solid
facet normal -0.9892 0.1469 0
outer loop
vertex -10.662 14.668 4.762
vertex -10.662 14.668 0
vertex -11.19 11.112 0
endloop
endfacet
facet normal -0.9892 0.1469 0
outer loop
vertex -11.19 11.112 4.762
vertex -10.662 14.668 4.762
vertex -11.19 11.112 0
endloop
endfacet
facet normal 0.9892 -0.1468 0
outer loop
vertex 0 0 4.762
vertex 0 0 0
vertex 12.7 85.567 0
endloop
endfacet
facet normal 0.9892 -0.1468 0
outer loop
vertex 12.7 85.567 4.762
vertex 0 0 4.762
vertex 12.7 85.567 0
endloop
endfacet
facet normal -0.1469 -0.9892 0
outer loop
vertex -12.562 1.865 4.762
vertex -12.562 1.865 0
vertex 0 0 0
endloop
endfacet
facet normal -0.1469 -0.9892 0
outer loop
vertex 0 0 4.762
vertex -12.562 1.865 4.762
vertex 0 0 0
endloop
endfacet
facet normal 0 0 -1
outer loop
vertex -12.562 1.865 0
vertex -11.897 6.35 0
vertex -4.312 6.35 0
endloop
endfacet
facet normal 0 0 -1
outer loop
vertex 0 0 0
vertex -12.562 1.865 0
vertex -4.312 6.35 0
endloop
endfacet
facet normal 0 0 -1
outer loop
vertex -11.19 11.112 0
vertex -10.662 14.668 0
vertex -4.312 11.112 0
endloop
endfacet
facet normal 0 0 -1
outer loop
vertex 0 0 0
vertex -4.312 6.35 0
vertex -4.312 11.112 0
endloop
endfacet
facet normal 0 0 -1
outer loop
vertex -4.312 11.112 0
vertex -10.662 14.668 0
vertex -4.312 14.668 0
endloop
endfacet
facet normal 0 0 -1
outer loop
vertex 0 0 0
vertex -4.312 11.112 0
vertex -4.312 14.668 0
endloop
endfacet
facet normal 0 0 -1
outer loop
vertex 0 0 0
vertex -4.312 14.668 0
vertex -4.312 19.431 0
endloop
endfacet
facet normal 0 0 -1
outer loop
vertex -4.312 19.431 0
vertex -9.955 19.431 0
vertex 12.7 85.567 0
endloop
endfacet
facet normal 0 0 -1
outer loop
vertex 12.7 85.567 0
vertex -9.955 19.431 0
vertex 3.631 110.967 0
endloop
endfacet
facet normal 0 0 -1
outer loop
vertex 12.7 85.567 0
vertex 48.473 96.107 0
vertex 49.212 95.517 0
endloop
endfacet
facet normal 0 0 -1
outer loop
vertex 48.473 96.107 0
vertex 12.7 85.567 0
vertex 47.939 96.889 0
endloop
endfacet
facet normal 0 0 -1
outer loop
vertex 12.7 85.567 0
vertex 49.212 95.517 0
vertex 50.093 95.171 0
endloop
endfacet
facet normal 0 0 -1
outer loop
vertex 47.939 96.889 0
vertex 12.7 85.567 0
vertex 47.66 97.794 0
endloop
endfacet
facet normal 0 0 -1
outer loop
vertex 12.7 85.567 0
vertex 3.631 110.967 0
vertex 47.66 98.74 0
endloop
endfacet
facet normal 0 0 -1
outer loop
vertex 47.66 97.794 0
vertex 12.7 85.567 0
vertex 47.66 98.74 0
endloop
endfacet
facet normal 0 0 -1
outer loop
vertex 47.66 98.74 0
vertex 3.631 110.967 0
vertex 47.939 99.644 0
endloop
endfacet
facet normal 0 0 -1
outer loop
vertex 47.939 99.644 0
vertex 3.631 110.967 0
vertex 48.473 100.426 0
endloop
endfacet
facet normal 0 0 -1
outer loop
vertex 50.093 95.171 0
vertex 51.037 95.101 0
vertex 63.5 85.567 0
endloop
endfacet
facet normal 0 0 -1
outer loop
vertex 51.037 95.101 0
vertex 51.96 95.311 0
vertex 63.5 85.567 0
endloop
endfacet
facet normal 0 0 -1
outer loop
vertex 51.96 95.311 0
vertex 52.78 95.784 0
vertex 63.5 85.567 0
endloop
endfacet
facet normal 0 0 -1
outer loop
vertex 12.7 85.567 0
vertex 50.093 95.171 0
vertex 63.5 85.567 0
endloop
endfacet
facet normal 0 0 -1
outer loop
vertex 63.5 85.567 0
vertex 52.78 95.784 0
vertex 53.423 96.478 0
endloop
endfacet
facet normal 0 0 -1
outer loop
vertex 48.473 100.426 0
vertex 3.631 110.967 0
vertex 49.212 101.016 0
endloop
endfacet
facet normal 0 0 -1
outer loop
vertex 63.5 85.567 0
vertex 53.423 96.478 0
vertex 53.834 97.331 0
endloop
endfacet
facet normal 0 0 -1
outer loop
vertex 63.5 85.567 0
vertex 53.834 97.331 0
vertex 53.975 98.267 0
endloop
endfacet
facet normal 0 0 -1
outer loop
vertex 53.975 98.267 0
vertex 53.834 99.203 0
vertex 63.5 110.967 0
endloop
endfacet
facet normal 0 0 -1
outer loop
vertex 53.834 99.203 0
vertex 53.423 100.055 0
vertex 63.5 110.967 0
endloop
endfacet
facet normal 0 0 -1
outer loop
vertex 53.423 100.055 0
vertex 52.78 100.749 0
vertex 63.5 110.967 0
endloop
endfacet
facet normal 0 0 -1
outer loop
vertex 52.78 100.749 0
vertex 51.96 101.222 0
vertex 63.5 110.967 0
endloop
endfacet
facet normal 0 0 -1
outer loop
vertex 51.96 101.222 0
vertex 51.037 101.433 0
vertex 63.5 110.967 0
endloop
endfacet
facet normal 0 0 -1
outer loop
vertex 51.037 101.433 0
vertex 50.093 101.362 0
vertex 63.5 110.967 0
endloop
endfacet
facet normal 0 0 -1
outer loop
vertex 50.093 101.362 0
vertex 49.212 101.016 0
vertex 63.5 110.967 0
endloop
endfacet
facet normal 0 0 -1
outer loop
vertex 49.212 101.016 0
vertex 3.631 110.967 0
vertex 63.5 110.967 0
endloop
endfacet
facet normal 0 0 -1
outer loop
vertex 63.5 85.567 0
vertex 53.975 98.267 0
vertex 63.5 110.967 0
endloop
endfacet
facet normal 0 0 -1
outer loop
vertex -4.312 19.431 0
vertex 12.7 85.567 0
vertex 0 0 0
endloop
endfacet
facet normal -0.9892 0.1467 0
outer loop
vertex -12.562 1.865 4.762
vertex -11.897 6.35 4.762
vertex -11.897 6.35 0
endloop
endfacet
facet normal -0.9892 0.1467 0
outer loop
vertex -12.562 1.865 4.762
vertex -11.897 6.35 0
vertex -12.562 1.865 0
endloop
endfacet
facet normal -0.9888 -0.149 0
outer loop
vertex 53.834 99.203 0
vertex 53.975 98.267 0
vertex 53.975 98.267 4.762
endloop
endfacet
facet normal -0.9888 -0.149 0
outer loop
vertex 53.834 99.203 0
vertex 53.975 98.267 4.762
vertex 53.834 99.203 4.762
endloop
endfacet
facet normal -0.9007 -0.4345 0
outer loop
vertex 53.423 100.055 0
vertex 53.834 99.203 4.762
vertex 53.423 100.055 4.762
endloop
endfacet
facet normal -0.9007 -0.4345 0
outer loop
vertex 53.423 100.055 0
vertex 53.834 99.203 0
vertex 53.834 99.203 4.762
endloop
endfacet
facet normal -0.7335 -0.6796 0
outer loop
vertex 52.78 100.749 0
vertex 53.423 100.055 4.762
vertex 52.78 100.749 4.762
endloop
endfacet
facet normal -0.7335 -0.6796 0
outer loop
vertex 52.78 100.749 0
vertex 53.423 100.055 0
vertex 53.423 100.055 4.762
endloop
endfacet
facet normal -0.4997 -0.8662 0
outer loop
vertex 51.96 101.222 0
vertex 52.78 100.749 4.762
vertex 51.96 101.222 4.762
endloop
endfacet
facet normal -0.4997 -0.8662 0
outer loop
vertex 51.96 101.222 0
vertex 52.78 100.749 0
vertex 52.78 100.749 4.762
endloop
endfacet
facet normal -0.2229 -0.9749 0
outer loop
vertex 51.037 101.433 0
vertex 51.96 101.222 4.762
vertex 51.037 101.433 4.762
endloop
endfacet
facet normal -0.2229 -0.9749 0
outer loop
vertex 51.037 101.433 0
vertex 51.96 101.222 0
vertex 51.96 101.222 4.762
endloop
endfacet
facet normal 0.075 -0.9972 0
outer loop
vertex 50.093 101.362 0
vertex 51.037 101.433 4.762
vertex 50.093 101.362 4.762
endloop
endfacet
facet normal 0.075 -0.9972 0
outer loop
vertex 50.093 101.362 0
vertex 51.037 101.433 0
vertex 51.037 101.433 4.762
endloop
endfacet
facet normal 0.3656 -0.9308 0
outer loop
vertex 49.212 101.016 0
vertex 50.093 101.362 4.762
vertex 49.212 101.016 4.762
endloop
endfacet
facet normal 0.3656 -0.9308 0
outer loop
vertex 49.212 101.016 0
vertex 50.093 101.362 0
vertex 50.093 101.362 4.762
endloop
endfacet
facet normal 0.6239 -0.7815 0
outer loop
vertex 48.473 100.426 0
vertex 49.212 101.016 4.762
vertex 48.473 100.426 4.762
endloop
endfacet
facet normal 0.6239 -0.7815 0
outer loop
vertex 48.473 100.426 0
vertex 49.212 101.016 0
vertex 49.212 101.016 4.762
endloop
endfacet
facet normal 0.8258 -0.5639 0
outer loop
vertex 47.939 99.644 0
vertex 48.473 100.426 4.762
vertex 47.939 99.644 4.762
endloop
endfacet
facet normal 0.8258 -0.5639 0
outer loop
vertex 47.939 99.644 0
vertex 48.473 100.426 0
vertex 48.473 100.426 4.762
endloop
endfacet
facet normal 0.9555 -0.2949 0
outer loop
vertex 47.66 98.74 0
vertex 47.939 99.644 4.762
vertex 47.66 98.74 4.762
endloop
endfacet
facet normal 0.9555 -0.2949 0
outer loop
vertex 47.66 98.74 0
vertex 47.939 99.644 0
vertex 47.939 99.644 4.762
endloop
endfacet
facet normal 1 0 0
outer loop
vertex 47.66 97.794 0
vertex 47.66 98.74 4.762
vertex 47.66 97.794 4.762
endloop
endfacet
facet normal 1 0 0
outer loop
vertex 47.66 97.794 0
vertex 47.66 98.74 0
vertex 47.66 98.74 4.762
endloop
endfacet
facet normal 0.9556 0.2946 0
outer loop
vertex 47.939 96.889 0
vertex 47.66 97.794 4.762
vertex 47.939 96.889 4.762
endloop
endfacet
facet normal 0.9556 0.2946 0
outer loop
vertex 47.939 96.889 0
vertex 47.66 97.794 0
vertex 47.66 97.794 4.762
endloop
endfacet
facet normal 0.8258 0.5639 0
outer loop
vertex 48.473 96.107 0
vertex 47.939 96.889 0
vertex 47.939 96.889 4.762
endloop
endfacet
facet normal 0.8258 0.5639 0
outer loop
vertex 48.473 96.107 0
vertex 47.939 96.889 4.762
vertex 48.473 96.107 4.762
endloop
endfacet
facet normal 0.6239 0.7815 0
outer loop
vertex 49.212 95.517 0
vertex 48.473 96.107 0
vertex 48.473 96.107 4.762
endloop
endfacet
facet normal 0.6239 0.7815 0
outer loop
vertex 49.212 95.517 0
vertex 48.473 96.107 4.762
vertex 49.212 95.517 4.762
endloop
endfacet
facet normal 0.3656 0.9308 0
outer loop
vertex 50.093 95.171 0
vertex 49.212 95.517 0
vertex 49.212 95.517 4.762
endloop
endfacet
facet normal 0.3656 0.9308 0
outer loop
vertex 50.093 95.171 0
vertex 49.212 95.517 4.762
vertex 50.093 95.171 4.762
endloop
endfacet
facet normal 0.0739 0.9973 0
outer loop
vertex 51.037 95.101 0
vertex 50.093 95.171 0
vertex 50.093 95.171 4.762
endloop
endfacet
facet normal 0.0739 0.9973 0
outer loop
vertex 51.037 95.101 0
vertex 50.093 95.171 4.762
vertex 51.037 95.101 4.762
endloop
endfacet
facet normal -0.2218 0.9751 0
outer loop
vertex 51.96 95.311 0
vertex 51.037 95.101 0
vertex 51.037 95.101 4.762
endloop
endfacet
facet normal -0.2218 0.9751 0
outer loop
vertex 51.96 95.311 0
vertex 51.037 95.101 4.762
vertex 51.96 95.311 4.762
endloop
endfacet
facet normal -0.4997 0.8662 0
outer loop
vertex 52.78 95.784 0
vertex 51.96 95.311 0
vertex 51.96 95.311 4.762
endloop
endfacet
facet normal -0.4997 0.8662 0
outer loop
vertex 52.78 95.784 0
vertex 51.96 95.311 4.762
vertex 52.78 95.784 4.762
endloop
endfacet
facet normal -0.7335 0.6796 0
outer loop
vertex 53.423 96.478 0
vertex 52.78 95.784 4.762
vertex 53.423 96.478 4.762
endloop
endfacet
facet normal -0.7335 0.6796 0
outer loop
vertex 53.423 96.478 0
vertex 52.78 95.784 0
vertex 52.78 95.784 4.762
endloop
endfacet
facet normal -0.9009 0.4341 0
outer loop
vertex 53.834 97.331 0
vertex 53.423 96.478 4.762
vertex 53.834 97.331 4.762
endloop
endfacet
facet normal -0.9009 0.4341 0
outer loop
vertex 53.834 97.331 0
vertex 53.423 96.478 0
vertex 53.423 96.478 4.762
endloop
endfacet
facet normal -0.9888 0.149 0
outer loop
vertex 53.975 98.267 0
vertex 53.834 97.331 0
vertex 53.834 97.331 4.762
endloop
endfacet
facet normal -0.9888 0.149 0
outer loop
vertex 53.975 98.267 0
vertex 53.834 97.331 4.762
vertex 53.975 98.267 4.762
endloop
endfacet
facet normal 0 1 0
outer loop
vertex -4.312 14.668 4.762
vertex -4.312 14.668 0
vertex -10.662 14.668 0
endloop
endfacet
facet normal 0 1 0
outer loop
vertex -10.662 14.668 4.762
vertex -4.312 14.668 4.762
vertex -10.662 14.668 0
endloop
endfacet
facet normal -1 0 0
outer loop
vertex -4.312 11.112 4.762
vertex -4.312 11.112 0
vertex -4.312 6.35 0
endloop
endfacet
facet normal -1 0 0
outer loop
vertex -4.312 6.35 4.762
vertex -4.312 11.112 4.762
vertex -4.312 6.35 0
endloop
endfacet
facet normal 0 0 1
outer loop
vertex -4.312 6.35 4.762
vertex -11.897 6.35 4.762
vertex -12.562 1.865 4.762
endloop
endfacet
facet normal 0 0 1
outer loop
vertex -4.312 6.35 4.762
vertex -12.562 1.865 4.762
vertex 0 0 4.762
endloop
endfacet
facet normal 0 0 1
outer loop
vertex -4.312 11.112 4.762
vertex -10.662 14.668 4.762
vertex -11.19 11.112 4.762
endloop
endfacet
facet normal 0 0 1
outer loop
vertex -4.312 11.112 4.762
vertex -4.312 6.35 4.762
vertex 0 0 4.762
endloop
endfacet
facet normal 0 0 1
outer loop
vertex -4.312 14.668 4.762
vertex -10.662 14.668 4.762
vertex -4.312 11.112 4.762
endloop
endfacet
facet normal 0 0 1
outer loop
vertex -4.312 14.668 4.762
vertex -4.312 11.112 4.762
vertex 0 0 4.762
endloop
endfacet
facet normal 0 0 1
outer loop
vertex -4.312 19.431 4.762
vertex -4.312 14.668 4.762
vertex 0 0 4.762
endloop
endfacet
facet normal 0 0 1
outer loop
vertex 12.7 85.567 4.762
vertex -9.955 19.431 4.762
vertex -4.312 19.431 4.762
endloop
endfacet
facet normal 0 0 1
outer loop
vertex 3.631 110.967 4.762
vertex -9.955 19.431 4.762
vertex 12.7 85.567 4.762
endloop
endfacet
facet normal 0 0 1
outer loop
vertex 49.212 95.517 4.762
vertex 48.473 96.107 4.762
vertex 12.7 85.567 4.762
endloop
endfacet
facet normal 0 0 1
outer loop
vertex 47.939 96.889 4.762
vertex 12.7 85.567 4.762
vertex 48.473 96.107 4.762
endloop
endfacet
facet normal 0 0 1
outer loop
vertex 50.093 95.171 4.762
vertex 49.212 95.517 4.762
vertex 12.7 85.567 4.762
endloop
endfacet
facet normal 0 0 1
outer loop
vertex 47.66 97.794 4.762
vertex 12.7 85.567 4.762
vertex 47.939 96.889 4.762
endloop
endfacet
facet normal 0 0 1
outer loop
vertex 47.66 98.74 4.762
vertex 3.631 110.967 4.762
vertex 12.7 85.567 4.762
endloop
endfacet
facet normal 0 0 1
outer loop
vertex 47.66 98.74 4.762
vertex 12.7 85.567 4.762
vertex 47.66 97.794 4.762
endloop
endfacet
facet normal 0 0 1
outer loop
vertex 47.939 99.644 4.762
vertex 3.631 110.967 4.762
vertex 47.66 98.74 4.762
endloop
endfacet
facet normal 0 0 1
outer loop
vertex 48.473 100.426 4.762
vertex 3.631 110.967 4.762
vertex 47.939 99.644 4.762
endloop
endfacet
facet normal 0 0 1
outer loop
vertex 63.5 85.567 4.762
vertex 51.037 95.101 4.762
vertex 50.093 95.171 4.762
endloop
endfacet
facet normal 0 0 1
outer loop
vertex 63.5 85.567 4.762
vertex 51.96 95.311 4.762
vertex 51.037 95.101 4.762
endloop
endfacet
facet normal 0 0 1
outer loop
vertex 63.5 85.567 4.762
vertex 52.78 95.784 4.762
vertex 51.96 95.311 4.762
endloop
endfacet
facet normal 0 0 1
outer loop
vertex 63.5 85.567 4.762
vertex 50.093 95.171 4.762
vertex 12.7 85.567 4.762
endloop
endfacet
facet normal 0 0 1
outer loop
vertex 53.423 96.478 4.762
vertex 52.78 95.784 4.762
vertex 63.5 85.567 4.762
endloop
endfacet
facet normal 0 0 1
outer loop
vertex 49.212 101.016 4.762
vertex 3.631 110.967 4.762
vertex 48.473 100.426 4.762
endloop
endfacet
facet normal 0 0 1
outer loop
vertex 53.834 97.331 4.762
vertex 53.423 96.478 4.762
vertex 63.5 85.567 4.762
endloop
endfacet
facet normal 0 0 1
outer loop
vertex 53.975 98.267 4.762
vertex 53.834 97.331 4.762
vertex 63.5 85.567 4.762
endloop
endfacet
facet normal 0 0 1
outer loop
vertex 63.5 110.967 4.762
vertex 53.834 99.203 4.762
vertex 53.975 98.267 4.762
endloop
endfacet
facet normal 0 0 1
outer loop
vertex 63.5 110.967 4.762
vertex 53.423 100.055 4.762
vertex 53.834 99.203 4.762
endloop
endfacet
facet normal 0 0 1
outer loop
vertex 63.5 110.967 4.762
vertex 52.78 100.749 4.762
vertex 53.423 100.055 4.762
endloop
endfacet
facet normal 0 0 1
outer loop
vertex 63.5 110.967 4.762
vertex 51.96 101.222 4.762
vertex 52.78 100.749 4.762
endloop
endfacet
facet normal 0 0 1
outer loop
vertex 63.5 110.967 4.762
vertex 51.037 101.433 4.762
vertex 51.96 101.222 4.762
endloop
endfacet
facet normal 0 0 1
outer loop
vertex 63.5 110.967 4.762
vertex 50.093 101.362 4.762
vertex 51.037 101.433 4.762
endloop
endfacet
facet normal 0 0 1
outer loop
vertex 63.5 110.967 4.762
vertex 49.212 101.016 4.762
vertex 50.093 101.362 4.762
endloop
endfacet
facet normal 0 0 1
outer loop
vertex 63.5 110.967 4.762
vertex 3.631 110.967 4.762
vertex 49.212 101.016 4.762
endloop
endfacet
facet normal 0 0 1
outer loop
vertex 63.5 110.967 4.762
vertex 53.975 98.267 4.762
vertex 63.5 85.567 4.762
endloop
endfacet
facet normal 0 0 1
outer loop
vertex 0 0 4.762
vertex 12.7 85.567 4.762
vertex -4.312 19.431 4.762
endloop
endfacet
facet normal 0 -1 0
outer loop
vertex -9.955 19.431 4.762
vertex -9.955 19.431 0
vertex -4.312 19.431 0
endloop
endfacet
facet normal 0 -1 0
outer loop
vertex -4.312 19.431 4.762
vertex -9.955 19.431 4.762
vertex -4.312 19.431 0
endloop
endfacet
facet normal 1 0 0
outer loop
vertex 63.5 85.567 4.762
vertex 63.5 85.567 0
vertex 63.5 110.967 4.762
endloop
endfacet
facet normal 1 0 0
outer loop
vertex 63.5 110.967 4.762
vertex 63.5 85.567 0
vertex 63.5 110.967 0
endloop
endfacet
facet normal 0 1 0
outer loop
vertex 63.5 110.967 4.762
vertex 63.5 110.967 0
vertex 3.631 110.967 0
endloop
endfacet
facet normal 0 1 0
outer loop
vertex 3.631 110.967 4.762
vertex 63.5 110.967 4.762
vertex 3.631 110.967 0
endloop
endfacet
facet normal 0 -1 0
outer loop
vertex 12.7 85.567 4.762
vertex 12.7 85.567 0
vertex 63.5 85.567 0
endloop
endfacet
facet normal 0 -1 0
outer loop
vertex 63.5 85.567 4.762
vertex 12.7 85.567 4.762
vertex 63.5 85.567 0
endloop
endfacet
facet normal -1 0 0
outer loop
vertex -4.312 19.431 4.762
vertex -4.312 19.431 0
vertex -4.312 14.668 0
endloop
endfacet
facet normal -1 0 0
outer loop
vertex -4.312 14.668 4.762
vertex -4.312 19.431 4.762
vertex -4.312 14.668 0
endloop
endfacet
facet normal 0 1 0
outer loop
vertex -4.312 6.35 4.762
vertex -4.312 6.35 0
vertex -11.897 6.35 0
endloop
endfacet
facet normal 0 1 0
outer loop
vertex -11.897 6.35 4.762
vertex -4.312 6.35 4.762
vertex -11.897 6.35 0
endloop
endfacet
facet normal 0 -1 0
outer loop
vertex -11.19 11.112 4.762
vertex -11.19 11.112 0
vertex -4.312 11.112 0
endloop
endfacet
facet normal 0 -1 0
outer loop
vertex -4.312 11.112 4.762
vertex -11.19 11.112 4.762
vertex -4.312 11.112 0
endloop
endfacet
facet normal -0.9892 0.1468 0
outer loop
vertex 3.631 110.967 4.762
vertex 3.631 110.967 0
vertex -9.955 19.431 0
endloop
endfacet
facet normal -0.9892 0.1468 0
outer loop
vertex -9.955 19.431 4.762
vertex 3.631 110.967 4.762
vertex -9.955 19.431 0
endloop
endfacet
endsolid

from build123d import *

# Parameters (mm, degrees)
SKETCH1_R           = 3.175
BOSS_EXTRUDE1_DEPTH = 4.7625


with BuildPart() as part:
    # Sketch1 → Boss-Extrude1 (new body)
    with BuildSketch(Plane.XY):
        Polygon((3.6307971, 110.966804989), (-9.955134074, 19.431), (-4.311994053, 19.431), (-4.311994053, 14.6685), (-10.661994053, 14.6685), (-11.189782837, 11.1125), (-4.311994053, 11.1125), (-4.311994053, 6.35), (-11.896642817, 6.35), (-12.562384724, 1.864534804), (0, 0), (12.7, 85.566804989), (63.5, 85.566804989), (63.5, 110.966804989), align=None)
        with Locations((50.8, 98.266804989)):
            Circle(SKETCH1_R, mode=Mode.SUBTRACT)
    extrude(amount=BOSS_EXTRUDE1_DEPTH)


solid = part.part
